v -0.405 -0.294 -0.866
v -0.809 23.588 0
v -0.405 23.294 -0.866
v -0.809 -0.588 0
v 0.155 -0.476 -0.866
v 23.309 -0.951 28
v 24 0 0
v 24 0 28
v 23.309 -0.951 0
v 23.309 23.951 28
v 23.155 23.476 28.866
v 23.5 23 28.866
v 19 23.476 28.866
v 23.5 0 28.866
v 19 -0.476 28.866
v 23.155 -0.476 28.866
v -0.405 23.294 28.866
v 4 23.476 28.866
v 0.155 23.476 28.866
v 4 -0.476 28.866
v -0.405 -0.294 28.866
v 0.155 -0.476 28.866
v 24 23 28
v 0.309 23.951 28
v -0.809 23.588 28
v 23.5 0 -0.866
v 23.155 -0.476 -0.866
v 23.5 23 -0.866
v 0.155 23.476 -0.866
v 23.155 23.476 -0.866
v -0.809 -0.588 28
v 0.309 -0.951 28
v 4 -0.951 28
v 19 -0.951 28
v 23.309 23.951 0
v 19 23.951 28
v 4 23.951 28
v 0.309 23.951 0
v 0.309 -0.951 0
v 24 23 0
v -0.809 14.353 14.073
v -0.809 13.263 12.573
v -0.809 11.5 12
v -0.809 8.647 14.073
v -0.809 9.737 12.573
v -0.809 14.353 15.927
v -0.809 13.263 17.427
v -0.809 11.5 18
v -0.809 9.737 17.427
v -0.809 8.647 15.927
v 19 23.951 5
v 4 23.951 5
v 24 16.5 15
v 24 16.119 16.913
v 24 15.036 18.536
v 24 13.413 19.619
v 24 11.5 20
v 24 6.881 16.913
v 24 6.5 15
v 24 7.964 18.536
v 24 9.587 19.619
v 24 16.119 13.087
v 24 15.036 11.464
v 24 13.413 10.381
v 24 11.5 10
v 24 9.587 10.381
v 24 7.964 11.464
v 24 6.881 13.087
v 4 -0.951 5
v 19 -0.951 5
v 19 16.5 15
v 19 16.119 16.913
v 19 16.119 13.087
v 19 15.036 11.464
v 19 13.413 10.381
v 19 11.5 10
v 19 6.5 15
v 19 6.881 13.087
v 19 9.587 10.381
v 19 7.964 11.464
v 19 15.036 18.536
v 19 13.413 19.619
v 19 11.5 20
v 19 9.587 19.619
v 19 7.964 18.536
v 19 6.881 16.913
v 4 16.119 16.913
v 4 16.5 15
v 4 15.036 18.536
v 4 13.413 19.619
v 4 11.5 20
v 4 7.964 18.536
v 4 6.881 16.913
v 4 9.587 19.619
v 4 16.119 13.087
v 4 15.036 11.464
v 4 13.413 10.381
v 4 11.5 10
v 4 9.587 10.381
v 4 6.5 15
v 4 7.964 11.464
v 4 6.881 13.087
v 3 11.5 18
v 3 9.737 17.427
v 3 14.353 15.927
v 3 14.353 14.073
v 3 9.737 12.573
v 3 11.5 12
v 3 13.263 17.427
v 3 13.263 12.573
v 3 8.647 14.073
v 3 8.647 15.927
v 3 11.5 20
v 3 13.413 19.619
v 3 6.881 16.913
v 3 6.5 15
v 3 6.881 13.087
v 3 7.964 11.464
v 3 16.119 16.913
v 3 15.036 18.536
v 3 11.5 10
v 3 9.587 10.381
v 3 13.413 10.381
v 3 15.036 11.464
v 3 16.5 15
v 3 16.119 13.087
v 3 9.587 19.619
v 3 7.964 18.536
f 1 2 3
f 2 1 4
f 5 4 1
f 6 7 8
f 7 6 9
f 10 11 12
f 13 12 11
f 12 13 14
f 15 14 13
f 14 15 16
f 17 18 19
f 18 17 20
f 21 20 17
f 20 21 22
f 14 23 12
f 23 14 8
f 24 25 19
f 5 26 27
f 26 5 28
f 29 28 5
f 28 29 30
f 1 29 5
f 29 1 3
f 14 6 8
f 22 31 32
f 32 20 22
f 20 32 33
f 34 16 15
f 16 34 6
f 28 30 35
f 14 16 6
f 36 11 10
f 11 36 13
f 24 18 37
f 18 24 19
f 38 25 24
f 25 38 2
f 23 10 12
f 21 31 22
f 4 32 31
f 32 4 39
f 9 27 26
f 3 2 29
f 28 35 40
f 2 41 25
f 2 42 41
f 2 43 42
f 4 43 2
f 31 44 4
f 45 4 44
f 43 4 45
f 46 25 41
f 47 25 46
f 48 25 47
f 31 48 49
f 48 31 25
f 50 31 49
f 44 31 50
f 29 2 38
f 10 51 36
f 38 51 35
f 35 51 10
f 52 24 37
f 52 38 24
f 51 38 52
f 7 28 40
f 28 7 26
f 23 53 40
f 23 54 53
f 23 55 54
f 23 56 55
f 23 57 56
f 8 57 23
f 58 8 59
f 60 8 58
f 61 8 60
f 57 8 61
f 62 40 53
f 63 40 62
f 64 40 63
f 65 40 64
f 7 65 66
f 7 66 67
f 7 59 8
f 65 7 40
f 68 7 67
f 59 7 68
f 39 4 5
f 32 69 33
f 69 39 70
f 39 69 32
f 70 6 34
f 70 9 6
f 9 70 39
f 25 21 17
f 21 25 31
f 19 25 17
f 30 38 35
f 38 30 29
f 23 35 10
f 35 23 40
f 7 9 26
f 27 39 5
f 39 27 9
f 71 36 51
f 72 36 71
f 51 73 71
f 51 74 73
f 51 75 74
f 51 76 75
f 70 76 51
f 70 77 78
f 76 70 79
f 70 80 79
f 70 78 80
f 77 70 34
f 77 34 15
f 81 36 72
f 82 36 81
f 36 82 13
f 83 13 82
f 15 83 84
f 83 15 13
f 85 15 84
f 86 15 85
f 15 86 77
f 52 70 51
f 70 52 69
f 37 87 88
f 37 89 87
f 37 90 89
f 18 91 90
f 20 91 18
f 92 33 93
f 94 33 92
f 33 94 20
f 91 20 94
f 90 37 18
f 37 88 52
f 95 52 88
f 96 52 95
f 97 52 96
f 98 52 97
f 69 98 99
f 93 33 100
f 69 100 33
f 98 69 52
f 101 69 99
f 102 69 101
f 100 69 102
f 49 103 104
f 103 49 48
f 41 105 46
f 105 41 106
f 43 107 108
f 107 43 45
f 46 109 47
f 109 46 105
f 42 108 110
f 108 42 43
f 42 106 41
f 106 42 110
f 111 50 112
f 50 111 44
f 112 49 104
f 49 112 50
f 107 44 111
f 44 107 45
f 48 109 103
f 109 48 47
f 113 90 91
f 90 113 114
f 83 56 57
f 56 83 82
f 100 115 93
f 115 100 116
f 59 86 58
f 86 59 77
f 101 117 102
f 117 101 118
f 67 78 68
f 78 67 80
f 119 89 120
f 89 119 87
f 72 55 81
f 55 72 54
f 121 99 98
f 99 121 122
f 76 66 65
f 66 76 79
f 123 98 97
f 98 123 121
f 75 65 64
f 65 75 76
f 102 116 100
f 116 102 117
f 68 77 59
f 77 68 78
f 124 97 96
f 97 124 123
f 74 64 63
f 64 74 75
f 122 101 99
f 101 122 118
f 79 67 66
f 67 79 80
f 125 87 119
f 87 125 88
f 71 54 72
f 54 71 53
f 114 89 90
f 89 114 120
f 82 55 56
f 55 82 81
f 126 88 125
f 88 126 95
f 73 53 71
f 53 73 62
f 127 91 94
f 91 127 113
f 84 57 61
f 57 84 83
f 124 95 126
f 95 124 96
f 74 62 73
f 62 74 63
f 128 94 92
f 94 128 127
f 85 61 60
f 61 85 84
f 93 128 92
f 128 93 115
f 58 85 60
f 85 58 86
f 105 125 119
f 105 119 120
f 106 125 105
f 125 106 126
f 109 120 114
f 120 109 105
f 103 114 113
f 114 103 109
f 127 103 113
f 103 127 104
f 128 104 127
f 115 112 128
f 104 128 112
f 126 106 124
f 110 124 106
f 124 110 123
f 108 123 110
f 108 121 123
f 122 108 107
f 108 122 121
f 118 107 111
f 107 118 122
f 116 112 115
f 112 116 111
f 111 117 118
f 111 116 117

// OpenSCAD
// @pabile 20180511
// U bracket openscad parametric customizeable customizer

uthick = 5; // bracket thickness
ulength = 15; // thickness of thing to insert inside bracket
uwidth = 25; // width of bracket arm;
udepth = 25; // height of bracket arm
screwhole = 3; // radius
driverhole = 5; // radius 

difference() {
    minkowski(){
        cube (size = [((uthick*2)+ulength)-2,uwidth-2,udepth+uthick-2]);
        sphere(1);
    }

    # translate ([uthick-1,-2,uthick]) {
        cube (size = [ulength,uwidth+1,udepth]);
    }

    // screw hole
    # translate ([0,(uwidth/2)-1,(udepth/2)+(uthick/2)]) {
        rotate (a=[0,90,0]) cylinder (uthick*2,screwhole,screwhole,center=true);
    }
    
    // driver hole
    # translate ([uthick-2,(uwidth/2)-1,(udepth/2)+(uthick/2)]) {
        rotate (a=[0,90,0]) cylinder (ulength*2,driverhole,driverhole,center=false);
    }
}
